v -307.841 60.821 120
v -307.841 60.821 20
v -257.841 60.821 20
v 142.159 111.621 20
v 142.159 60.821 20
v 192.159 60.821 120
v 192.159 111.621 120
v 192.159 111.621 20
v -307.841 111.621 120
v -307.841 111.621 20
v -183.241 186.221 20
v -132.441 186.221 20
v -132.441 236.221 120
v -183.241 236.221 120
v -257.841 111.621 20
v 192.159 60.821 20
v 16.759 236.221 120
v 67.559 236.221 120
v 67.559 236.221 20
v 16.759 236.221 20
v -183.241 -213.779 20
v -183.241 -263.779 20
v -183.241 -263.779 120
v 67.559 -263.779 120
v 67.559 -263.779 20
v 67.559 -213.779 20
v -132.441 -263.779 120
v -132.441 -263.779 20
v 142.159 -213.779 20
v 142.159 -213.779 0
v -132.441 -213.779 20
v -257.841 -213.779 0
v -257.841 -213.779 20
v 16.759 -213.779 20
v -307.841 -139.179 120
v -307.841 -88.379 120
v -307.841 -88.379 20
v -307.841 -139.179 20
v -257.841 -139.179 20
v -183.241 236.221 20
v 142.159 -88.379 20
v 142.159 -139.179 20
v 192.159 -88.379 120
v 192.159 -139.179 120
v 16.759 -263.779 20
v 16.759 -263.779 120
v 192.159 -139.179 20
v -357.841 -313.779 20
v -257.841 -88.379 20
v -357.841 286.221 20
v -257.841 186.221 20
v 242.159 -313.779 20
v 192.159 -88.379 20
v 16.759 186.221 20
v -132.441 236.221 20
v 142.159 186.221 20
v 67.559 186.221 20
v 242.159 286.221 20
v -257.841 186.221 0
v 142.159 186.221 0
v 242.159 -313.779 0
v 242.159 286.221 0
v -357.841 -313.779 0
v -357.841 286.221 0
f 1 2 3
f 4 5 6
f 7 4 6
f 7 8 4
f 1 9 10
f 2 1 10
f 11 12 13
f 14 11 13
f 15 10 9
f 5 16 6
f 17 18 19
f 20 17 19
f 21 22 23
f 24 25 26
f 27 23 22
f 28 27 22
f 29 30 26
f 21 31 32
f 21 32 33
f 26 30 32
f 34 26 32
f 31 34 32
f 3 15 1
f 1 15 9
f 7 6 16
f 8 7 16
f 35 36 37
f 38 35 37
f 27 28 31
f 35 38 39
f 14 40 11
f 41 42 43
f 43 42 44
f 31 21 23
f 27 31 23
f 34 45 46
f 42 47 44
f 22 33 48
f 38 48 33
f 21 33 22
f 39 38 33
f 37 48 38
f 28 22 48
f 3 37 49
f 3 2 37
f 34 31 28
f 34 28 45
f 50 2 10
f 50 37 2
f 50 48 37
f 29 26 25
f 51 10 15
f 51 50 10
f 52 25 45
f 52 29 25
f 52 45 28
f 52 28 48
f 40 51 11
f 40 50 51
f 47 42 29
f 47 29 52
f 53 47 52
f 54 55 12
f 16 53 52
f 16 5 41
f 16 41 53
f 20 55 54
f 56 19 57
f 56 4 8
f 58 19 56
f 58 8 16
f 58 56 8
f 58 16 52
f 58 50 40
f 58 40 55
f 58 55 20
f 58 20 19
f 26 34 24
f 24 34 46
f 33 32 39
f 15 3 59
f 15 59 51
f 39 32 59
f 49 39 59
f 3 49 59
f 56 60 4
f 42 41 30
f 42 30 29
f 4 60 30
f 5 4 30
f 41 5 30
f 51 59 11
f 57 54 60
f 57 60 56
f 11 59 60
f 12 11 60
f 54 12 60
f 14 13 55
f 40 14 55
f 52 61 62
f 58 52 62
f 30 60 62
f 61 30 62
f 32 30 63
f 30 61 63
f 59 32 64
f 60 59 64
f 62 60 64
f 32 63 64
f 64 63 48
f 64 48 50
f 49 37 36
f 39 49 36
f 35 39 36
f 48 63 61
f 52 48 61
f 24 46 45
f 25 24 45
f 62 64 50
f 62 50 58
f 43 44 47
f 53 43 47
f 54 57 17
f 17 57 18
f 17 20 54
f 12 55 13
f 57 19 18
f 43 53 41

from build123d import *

# Parameters (mm, degrees)
F0_W      = 600
F0_H      = 600
F1_DEPTH  = 20
F2_W      = 50
F2_H      = 20
F3_W      = 50
F3_H      = 20
F8_DEPTH  = 50.8
F4_W      = 50
F4_H      = 20
F5_W      = 50
F5_H      = 20
F11_DEPTH = 50.8
F6_W      = 50
F6_H      = 20
F7_W      = 50
F7_H      = 20
F12_DEPTH = 50.8
F9_W      = 50
F9_H      = 20
F10_W     = 50
F10_H     = 20
F13_DEPTH = 50.8


# Not quite as in the source:
# - a feature names something its author has since deleted; it is built from what else it names


with BuildPart() as f1:
    # F0 (on Top) → F1 (new body)
    with BuildSketch(Plane.XY):
        with Locations((-57.8414618969, -13.7785196304)):
            Rectangle(F0_W, F0_H)
        Polygon((-257.8414618969, 111.6214803696), (-257.8414618969, 186.2214803696), (-183.2414618969, 186.2214803696), (-183.2414618969, 236.2214803696), (-157.8414618969, 236.2214803696), (-132.4414618969, 236.2214803696), (-132.4414618969, 186.2214803696), (16.7585381031, 186.2214803696), (16.7585381031, 236.2214803696), (67.5585381031, 236.2214803696), (67.5585381031, 186.2214803696), (142.1585381031, 186.2214803696), (142.1585381031, 111.6214803696), (192.1585381031, 111.6214803696), (192.1585381031, 60.8214803696), (142.1585381031, 60.8214803696), (142.1585381031, -88.3785196304), (192.1585381031, -88.3785196304), (192.1585381031, -139.1785196304), (142.1585381031, -139.1785196304), (142.1585381031, -213.7785196304), (67.5585381031, -213.7785196304), (67.5585381031, -263.7785196304), (16.7585381031, -263.7785196304), (16.7585381031, -213.7785196304), (-132.4414618969, -213.7785196304), (-132.4414618969, -263.7785196304), (-183.2414618969, -263.7785196304), (-183.2414618969, -213.7785196304), (-257.8414618969, -213.7785196304), (-257.8414618969, -139.1785196304), (-307.8414618969, -139.1785196304), (-307.8414618969, -88.3785196304), (-257.8414618969, -88.3785196304), (-257.8414618969, -13.7785196304), (-257.8414618969, 60.8214803696), (-307.8414618969, 60.8214803696), (-307.8414618969, 111.6214803696), align=None, mode=Mode.SUBTRACT)
    extrude(amount=F1_DEPTH)

    # F2 (on face) + F3 (on face) → F8 (join)
    with BuildSketch(Plane.XZ.offset(88.3785196304)):
        Polygon((-307.8414618969, 20), (-257.8414618969, 20), (-307.8414618969, 120), align=None)
        with Locations((-282.8414618969, 10)):
            Rectangle(F2_W, F2_H)
    with BuildSketch(Plane.XZ.offset(-111.6214803696)):
        Polygon((-307.8414618969, 20), (-257.8414618969, 20), (-307.8414618969, 120), align=None)
        with Locations((-282.8414618969, 10)):
            Rectangle(F3_W, F3_H)
    extrude(amount=F8_DEPTH)

    # F4 (on face) + F5 (on face) → F11 (join)
    with BuildSketch(Plane(origin=(-132.4414618969, 0, 0), x_dir=(0, -1, 0), z_dir=(-1, 0, 0))):
        Polygon((-236.2214803696, 20), (-186.2214803696, 20), (-236.2214803696, 120), align=None)
        with Locations((-211.2214803696, 10)):
            Rectangle(F4_W, F4_H)
    with BuildSketch(Plane(origin=(67.5585381031, 0, 0), x_dir=(0, -1, 0), z_dir=(-1, 0, 0))):
        with Locations((-211.2214803696, 10)):
            Rectangle(F5_W, F5_H)
        Polygon((-236.2214803696, 20), (-186.2214803696, 20), (-236.2214803696, 120), align=None)
    extrude(amount=F11_DEPTH)

    # F6 (on face) + F7 (on face) → F12 (join)
    with BuildSketch(Plane(origin=(0, 60.8214803696, 0), x_dir=(-1, 0, 0), z_dir=(0, 1, 0))):
        with Locations((-167.1585381031, 10)):
            Rectangle(F6_W, F6_H)
        Polygon((-192.1585381031, 20), (-142.1585381031, 20), (-192.1585381031, 120), align=None)
    with BuildSketch(Plane(origin=(0, -139.1785196304, 0), x_dir=(-1, 0, 0), z_dir=(0, 1, 0))):
        with Locations((-167.1585381031, 10)):
            Rectangle(F7_W, F7_H)
        Polygon((-192.1585381031, 20), (-142.1585381031, 20), (-192.1585381031, 120), align=None)
    extrude(amount=F12_DEPTH)

    # F9 (on face) + F10 (on face) → F13 (join)
    with BuildSketch(Plane.YZ.offset(16.7585381031)):
        with Locations((-238.7785196304, 10)):
            Rectangle(F9_W, F9_H)
        Polygon((-263.7785196304, 20), (-213.7785196304, 20), (-263.7785196304, 120), align=None)
    with BuildSketch(Plane.YZ.offset(-183.2414618969)):
        with Locations((-238.7785196304, 10)):
            Rectangle(F10_W, F10_H)
        Polygon((-263.7785196304, 20), (-213.7785196304, 20), (-263.7785196304, 120), align=None)
    extrude(amount=F13_DEPTH)


solid = f1.part
